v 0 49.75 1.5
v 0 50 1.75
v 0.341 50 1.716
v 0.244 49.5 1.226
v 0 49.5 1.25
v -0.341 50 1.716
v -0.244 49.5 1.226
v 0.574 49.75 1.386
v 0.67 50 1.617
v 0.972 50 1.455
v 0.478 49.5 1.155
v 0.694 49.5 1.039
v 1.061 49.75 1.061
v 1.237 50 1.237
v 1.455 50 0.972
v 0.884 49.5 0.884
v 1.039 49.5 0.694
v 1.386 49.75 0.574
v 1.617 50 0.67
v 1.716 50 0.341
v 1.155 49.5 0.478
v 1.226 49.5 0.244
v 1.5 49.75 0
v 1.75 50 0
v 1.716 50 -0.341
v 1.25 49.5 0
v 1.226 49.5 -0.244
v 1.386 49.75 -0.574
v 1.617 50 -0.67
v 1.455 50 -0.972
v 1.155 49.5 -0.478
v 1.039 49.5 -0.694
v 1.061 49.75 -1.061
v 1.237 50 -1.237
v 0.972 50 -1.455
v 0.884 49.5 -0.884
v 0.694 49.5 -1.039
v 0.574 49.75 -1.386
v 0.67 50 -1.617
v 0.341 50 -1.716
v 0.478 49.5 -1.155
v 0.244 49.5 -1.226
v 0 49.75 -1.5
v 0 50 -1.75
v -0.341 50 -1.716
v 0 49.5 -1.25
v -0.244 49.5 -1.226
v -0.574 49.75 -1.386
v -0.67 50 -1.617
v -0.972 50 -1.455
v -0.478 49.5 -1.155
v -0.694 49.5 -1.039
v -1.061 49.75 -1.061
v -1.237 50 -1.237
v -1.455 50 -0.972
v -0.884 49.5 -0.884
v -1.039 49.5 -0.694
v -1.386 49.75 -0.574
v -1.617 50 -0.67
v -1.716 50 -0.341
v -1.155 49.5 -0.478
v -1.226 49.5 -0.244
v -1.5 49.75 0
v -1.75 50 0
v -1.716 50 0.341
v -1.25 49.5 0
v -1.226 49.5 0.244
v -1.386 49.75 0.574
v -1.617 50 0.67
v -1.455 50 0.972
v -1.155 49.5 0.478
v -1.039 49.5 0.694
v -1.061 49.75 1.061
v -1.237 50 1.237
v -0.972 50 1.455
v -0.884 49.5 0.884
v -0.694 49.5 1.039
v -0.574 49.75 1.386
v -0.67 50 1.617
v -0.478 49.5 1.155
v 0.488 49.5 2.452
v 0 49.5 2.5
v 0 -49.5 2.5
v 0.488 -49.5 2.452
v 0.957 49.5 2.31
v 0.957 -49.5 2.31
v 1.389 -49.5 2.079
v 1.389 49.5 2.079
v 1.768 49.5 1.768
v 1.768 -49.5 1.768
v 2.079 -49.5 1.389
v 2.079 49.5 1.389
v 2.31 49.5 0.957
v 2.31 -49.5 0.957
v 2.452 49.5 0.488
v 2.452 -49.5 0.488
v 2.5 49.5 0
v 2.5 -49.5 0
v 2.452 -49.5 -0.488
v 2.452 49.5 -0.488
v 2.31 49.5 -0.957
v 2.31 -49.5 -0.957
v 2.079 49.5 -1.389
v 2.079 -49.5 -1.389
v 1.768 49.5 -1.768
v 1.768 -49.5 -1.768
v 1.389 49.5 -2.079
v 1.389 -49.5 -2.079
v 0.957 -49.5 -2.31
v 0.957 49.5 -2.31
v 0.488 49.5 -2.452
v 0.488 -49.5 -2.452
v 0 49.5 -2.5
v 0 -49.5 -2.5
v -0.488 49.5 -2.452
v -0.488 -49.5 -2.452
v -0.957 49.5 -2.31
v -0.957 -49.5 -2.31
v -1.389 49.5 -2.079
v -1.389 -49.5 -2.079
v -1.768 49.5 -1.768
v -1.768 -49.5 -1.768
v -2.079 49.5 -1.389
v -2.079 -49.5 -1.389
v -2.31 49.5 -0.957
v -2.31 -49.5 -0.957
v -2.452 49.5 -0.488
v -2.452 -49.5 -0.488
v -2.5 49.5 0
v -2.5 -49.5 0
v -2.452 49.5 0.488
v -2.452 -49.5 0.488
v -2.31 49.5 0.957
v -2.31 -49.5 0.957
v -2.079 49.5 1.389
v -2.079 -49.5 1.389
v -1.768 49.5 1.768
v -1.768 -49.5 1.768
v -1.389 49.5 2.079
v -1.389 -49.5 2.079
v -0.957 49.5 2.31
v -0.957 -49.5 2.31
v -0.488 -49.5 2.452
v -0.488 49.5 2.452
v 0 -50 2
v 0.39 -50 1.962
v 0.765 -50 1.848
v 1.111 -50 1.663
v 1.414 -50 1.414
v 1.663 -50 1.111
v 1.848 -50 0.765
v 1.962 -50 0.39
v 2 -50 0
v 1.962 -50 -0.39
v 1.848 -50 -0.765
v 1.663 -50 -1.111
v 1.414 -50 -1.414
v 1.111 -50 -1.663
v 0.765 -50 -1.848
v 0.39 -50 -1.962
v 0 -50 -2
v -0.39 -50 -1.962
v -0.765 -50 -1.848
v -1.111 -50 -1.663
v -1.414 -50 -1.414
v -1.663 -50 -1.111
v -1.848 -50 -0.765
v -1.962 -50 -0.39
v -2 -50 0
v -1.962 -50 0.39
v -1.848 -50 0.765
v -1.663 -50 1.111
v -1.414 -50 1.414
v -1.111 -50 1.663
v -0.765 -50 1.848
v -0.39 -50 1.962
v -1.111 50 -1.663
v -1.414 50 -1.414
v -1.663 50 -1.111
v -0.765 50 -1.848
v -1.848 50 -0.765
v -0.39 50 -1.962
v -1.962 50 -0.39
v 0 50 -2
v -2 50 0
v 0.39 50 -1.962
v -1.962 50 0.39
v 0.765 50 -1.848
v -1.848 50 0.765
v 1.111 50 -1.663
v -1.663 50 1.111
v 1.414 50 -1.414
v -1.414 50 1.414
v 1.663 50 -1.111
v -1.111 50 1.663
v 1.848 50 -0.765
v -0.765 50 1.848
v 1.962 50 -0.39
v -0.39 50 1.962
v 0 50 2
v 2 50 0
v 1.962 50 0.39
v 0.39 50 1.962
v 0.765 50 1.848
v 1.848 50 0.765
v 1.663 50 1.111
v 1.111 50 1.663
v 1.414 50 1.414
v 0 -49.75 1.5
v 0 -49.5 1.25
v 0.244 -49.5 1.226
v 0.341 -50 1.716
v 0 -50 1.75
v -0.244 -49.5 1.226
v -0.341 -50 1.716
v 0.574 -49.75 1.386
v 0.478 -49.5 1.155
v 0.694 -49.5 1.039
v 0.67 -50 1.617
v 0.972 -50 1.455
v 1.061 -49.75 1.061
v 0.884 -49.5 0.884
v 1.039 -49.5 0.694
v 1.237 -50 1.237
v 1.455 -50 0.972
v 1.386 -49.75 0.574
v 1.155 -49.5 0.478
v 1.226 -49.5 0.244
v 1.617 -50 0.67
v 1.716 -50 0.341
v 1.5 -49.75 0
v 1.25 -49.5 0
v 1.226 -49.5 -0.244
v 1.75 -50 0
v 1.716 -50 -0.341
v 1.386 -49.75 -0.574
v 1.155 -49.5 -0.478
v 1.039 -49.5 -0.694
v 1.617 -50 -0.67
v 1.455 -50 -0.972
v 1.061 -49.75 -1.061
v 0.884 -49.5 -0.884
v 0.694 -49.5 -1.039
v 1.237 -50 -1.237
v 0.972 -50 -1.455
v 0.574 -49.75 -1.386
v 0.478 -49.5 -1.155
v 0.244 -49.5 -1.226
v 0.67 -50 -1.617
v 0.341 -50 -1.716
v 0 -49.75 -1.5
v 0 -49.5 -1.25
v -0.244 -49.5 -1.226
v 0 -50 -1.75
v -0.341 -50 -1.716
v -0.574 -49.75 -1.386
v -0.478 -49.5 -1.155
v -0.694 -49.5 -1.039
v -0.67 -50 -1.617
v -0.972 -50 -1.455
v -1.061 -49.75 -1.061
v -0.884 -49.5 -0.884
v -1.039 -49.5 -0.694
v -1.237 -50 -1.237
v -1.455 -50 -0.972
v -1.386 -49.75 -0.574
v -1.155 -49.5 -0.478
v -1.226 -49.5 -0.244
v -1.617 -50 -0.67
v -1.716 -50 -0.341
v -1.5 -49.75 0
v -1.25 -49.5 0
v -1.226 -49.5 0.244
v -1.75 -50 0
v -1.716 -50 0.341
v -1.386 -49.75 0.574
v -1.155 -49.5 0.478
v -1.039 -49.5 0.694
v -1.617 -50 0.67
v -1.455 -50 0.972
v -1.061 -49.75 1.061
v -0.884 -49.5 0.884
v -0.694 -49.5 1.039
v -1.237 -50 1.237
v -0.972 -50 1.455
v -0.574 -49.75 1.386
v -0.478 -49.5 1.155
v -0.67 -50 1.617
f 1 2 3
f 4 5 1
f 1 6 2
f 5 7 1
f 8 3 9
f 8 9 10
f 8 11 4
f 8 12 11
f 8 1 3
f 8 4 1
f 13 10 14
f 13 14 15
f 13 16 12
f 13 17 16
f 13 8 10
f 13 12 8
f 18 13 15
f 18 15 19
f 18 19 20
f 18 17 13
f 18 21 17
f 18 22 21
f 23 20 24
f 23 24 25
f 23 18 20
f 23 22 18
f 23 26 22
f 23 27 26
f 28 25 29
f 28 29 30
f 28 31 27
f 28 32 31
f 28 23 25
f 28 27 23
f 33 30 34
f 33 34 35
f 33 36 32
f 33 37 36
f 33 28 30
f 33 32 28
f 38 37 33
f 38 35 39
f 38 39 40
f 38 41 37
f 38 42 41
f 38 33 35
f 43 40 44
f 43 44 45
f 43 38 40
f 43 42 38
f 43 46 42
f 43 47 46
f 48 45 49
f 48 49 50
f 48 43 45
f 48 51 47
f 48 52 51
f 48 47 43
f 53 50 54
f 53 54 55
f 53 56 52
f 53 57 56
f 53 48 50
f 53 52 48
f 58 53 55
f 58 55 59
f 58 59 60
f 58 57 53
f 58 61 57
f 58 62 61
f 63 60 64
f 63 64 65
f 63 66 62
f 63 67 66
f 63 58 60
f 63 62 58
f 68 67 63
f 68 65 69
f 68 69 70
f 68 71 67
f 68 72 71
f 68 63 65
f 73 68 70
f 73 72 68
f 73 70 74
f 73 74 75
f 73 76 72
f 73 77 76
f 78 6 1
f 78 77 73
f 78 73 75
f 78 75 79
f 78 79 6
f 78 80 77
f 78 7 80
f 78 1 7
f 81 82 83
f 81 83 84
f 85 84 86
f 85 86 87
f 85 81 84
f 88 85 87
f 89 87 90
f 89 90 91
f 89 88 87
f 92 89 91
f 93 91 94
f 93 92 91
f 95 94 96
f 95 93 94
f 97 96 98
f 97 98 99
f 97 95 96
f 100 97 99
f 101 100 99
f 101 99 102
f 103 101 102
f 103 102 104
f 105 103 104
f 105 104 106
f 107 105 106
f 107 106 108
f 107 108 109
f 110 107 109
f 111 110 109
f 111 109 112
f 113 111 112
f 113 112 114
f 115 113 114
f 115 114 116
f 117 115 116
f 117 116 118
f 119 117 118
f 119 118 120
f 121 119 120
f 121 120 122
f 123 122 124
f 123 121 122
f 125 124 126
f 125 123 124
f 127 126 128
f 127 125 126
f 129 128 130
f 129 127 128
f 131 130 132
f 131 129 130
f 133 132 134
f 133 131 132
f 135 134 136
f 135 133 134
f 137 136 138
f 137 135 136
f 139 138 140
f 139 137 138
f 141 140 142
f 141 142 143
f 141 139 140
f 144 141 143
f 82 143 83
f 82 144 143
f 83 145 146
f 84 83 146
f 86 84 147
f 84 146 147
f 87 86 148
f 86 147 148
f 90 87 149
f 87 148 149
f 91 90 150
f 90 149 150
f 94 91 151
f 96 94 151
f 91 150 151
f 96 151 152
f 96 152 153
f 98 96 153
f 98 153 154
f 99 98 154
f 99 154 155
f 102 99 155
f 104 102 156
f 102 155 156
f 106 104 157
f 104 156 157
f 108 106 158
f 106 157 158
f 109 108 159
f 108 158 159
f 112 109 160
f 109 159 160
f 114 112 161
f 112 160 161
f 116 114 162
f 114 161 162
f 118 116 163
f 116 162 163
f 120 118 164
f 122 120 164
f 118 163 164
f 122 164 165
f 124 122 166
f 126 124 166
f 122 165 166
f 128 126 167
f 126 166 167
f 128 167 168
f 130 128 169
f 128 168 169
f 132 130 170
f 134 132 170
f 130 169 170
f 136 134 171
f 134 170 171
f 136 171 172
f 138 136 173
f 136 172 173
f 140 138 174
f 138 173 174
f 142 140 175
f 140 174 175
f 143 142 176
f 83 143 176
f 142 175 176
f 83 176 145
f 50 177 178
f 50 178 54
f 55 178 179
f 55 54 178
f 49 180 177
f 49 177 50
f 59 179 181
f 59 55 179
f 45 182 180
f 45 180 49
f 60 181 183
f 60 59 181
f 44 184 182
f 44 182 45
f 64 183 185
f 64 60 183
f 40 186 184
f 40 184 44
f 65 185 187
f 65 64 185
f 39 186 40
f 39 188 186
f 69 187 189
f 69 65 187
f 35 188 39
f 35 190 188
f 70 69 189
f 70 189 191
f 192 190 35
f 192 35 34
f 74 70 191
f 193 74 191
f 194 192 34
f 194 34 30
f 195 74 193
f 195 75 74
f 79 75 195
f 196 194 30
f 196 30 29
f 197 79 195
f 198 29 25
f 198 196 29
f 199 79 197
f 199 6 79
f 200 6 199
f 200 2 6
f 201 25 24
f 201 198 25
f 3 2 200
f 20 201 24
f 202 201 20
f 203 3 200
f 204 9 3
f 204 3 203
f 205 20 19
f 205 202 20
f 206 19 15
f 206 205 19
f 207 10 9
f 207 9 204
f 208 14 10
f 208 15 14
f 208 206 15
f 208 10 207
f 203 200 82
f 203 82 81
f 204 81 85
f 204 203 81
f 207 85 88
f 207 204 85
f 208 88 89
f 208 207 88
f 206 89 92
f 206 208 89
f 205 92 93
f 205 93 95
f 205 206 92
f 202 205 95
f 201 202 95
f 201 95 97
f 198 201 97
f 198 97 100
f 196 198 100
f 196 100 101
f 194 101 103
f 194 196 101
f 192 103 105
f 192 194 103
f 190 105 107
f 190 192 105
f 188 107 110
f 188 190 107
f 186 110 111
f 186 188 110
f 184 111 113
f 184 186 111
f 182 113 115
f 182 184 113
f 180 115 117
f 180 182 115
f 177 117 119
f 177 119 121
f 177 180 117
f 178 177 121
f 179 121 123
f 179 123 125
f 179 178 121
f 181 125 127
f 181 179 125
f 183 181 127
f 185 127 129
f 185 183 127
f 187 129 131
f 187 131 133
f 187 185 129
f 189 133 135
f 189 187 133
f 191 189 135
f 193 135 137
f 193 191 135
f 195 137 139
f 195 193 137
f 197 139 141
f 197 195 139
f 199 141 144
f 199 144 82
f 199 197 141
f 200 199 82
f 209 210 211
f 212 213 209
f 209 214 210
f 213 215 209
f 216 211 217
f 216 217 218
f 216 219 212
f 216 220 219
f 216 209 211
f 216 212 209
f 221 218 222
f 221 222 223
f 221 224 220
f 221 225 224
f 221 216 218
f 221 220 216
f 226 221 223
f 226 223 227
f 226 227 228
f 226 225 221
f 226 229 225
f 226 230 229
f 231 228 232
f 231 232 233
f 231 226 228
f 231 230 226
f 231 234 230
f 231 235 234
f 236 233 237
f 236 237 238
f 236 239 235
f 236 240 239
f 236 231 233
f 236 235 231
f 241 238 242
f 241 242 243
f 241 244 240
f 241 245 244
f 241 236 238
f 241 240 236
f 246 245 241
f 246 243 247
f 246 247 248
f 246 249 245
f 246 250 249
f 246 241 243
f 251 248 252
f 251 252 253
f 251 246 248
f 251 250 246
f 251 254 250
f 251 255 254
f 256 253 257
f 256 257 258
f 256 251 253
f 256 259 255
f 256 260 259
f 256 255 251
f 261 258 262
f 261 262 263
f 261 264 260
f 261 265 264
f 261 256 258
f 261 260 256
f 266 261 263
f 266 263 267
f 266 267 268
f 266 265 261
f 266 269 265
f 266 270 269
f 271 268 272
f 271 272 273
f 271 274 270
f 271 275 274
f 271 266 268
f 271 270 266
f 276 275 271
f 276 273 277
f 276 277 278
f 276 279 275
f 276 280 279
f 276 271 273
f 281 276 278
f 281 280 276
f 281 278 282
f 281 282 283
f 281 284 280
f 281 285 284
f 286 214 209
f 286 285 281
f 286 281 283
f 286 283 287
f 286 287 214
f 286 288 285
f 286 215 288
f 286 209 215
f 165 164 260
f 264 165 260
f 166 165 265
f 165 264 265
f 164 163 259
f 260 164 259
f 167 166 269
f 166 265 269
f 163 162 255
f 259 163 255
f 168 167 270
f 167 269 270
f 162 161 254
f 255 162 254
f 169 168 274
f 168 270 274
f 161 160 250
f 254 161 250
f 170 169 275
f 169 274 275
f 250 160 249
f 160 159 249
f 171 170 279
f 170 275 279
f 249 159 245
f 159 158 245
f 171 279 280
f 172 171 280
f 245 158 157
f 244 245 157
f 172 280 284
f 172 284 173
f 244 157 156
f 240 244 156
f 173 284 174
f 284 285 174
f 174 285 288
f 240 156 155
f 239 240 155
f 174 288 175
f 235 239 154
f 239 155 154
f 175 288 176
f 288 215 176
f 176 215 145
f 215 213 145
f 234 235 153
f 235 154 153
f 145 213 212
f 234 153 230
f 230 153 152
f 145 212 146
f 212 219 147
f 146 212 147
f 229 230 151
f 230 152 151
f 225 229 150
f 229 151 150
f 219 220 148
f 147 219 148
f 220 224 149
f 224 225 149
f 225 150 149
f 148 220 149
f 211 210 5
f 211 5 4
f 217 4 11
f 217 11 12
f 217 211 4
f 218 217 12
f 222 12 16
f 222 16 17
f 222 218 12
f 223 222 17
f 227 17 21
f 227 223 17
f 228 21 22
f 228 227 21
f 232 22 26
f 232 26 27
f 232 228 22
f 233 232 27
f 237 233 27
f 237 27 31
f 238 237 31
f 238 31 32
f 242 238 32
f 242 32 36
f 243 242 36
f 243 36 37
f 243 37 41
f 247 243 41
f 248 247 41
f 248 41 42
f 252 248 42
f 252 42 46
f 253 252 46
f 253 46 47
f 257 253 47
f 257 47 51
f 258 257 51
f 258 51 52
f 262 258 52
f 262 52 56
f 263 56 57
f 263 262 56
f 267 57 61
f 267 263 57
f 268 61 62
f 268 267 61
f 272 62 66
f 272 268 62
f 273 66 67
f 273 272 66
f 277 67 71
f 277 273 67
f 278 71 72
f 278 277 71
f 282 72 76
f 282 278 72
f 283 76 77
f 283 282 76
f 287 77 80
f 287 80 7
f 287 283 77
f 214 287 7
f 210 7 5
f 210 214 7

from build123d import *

# Parameters (mm, degrees)
SKETCH1_R      = 2.5
SKETCH1_R_2    = 1.25
EXTRUDE1_DEPTH = 50
CHAMFER1_SIZE  = 0.5


with BuildPart() as part:
    # Sketch1 → Extrude1 (new, symmetric)
    with BuildSketch(Plane(origin=(0, 0, 0), x_dir=(1, 0, 0), z_dir=(0, 1, 0))):
        with Locations(Location((0, 0, 0), (0, 0, 270))):
            Circle(SKETCH1_R)
        with Locations(Location((0, 0, 0), (0, 0, 270))):
            Circle(SKETCH1_R_2, mode=Mode.SUBTRACT)
    extrude(amount=EXTRUDE1_DEPTH, both=True)

    # Chamfer1
    chamfer1_edges = [part.edges().sort_by_distance(p)[0] for p in [
        (0, -50, -2.5),
        (0, 50, -2.5),
        (0, -50, -1.25),
        (0, 50, -1.25),
    ]]
    chamfer(chamfer1_edges, length=CHAMFER1_SIZE)


solid = part.part
